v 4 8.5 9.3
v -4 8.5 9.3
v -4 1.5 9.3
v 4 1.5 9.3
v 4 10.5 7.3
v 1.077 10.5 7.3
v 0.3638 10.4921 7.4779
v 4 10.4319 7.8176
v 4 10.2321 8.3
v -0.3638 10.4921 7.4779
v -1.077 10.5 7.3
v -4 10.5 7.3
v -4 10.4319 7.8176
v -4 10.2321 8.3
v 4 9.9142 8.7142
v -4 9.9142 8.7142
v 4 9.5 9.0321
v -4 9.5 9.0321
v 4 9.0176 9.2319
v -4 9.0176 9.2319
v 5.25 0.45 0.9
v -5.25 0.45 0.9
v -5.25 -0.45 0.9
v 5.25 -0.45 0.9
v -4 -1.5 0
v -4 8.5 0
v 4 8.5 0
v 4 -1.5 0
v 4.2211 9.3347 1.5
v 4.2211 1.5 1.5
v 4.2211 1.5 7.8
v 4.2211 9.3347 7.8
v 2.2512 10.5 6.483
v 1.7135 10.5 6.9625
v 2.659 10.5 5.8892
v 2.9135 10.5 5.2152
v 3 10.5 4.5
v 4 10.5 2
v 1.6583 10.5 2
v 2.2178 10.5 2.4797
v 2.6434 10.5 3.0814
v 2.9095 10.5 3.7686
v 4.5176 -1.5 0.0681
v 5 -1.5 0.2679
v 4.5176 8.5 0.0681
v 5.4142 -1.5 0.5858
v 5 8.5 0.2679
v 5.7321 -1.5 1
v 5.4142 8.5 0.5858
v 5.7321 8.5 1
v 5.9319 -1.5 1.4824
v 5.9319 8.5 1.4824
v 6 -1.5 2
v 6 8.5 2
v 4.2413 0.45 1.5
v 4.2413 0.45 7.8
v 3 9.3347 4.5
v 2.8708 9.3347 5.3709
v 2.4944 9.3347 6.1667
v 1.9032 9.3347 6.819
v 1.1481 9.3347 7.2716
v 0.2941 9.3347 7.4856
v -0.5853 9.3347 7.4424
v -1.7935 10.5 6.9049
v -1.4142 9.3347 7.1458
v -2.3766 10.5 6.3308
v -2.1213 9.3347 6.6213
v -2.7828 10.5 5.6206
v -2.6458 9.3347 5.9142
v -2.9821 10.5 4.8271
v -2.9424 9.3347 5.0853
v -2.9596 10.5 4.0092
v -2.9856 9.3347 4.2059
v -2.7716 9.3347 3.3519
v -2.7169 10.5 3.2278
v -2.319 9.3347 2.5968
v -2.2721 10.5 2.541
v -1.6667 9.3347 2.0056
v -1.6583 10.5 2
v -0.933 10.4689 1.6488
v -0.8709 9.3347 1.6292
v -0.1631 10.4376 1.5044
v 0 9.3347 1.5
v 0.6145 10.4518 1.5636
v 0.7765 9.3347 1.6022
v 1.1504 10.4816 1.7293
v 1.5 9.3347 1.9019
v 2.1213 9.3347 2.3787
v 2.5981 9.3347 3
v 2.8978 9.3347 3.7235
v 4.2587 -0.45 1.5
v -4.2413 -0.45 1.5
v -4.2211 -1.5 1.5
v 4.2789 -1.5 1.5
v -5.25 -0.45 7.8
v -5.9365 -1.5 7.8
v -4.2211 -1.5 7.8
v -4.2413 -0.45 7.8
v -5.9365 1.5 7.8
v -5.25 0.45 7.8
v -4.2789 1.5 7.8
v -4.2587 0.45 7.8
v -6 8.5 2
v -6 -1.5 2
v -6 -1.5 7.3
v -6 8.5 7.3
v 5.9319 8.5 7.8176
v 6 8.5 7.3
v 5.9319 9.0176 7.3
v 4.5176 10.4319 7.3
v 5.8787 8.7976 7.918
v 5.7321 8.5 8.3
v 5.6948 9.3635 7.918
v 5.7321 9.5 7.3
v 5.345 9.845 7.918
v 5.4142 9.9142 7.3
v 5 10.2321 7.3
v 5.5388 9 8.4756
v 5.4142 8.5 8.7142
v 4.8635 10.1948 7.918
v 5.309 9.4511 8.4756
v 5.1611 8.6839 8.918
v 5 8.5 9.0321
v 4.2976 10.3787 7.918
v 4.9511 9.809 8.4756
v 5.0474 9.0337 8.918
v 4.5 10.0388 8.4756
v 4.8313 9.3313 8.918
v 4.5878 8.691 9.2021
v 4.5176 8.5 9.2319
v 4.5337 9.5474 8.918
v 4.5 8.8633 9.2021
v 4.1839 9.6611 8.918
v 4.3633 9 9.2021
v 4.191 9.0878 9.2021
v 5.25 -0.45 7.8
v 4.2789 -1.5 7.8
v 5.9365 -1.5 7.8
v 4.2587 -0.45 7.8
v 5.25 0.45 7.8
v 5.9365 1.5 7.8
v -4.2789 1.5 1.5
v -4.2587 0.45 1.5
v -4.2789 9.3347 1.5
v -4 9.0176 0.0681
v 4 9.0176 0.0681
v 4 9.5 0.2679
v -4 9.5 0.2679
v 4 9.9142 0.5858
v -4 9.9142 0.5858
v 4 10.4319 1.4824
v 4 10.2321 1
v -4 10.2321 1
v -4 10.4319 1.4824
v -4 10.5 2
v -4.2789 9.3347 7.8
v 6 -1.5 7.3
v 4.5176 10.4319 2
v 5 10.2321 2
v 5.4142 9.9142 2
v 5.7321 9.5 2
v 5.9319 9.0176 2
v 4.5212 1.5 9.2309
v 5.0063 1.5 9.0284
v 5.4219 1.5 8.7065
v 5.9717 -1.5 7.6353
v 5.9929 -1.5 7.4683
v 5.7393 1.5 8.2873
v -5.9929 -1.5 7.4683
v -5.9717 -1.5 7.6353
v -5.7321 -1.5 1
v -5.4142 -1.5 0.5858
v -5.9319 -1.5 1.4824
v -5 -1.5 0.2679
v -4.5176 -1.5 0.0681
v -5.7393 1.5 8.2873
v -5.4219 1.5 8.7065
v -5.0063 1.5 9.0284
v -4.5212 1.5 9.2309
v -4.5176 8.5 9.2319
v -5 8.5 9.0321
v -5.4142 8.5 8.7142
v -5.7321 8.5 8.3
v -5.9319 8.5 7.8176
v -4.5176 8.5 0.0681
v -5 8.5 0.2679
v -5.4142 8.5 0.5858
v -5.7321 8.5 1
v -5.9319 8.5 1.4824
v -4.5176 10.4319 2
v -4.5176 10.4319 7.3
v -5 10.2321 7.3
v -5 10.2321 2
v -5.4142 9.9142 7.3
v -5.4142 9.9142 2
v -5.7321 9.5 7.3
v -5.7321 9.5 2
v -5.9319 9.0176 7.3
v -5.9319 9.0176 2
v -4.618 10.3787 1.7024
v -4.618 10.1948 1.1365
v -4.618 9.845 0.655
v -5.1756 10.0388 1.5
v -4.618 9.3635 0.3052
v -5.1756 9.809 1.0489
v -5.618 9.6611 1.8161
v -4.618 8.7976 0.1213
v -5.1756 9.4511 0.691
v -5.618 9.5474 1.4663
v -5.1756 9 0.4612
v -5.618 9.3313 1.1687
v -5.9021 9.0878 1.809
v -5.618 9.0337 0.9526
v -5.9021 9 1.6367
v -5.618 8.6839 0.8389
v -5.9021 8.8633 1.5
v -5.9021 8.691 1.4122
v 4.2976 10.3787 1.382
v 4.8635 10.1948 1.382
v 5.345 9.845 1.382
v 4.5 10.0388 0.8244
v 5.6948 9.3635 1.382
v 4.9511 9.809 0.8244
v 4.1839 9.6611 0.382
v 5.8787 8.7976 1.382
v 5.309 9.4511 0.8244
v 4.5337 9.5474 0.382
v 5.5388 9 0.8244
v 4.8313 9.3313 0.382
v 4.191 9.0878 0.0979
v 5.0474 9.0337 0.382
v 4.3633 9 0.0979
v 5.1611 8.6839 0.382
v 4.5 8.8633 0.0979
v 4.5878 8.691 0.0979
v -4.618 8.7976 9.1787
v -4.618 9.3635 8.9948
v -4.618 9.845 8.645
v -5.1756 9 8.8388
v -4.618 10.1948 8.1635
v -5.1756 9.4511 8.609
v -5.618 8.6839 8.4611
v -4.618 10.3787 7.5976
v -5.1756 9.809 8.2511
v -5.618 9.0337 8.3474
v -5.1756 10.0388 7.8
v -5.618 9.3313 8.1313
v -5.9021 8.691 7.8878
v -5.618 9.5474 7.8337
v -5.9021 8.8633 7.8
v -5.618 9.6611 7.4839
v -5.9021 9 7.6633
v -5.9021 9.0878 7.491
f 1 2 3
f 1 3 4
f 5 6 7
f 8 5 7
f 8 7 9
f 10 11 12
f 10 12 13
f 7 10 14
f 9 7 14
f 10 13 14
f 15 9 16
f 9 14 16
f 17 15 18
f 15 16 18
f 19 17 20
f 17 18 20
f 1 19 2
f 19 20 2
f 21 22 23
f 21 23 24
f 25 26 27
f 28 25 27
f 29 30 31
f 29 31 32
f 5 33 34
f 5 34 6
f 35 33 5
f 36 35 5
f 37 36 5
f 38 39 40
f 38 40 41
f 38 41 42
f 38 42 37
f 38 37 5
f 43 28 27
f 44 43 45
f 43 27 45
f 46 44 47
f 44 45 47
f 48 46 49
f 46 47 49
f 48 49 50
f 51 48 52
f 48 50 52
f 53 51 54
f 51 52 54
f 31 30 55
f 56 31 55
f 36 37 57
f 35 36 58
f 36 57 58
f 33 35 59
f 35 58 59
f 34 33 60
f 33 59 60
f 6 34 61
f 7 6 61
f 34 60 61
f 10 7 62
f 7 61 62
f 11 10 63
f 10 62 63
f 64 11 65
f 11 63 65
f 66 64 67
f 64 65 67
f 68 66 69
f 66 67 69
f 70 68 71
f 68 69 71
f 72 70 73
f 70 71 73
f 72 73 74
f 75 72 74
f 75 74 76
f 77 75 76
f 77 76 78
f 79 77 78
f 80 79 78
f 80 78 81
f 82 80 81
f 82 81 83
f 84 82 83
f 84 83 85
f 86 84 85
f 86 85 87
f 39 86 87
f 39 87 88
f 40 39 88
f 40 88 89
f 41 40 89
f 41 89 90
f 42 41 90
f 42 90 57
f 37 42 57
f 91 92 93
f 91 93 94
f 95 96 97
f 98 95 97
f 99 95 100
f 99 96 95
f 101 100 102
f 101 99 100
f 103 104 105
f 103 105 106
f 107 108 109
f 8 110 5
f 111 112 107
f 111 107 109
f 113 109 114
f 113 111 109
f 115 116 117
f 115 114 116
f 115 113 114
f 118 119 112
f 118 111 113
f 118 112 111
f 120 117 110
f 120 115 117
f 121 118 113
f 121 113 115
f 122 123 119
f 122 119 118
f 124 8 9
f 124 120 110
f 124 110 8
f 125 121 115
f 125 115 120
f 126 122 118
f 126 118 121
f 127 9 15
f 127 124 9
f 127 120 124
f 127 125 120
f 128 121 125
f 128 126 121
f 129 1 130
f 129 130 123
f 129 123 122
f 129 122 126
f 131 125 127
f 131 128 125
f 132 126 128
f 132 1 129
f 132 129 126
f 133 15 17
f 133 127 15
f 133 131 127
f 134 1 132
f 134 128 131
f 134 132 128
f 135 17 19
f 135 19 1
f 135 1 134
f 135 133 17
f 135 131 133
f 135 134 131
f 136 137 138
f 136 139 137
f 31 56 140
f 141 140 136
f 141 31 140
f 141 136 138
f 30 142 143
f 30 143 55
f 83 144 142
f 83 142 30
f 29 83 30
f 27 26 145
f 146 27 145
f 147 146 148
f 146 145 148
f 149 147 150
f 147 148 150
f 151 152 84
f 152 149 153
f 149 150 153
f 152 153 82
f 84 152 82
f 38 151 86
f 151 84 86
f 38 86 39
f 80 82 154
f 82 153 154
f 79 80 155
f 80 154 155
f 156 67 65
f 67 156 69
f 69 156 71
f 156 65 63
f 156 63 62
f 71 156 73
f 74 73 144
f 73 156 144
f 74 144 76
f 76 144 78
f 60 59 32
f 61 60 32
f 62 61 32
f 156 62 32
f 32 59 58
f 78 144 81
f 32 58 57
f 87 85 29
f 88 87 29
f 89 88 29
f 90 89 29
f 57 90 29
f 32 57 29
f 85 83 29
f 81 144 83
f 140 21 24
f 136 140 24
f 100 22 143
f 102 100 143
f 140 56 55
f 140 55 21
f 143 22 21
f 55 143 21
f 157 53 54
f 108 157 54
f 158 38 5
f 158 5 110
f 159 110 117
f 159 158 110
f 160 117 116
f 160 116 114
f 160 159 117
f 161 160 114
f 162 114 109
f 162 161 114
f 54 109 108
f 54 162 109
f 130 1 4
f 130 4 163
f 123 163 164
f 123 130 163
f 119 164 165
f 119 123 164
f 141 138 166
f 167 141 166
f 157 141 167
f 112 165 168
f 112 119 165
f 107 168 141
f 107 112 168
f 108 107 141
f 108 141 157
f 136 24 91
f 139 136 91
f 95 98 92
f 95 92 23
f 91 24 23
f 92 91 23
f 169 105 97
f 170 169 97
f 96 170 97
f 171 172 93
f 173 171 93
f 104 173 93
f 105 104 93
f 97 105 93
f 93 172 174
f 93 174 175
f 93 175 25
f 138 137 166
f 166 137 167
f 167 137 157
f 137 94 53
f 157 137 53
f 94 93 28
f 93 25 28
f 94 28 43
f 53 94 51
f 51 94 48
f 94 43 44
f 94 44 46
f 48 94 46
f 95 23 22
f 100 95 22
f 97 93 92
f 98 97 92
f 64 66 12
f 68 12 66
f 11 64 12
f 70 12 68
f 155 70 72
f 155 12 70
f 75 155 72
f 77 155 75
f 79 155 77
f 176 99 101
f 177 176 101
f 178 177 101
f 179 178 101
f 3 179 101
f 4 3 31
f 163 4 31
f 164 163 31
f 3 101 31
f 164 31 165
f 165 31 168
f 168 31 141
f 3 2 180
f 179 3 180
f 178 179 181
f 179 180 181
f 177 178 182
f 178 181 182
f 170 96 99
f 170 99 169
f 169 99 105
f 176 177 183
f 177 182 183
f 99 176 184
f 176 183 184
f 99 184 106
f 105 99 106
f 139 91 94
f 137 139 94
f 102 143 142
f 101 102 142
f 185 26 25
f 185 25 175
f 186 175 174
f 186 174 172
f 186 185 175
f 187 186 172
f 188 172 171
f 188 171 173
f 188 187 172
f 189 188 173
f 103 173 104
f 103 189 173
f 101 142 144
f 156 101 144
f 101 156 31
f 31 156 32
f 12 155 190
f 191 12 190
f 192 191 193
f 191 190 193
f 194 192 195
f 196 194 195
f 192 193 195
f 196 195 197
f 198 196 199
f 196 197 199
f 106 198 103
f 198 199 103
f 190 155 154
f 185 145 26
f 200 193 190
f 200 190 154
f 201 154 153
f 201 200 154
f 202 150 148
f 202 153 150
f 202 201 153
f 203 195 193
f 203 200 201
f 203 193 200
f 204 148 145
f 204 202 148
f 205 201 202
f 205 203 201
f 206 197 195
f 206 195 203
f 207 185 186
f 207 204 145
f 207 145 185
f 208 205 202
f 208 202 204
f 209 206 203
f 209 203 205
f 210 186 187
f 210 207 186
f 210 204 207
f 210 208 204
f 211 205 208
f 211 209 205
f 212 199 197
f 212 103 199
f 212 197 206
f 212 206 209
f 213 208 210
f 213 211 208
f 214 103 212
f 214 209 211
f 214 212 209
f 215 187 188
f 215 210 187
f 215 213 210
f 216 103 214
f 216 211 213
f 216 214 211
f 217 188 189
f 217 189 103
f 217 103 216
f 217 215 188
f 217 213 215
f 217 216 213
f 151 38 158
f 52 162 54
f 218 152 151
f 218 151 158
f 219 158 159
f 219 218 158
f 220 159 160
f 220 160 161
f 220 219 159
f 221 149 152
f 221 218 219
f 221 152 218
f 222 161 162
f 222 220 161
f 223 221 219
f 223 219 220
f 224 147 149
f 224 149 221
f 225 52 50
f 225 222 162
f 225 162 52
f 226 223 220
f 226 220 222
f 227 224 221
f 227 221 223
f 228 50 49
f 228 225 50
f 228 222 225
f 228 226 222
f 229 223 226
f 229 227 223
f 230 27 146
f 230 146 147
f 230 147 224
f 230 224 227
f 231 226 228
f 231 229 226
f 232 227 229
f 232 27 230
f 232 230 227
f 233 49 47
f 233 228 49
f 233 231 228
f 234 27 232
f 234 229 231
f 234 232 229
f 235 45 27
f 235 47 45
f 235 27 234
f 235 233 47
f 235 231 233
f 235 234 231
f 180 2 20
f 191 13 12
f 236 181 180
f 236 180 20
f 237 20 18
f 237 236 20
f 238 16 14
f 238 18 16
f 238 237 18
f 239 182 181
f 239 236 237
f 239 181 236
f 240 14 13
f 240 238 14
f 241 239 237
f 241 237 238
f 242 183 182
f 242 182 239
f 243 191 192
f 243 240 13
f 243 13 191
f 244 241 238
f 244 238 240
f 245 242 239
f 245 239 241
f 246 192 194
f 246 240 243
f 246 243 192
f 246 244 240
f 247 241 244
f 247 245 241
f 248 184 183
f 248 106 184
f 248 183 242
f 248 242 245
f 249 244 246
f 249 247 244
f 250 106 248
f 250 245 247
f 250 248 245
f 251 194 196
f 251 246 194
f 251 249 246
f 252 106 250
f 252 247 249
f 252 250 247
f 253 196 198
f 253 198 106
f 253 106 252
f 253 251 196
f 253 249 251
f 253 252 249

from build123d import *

# Parameters (mm, degrees)
F0_W         = 8.5
F0_H         = 7.834737435
F0_W_2       = 1.7211329822
F0_H_2       = 1.165262565
F0_W_3       = 1.7788670178
F1_DEPTH     = 0.9
F2_DEPTH     = 1.5
F3_DEPTH     = 7.8
F5_W         = 12
F5_H         = 9
F6_DEPTH     = 1.5
F7_R         = 3
F8_DEPTH     = 10.501
F9_T1_DEPTH  = 5.3
F9_T3_DEPTH  = 8
F9_T5_DEPTH  = 12
F9_T7_DEPTH  = 15
F9_S11_W     = 2
F9_S11_H     = 2
F9_T12_DEPTH = 2
F9_S17_W     = 2
F9_S17_H     = 2
F9_T18_DEPTH = 2
F9_S23_W     = 2
F9_S23_H     = 2
F9_T24_DEPTH = 2
F9_S29_W     = 2
F9_S29_H     = 2
F9_T30_DEPTH = 2


# Not quite as in the source:
# - a fillet or chamfer that OpenCascade refuses, or shapes differently, is made with other operations: its cross-section is extruded or revolved along the edge and cut away or added
# - a feature names something its author has since deleted; it is built from what else it names


with BuildPart() as f1:
    # F0 (on Top) → F1 (new body)
    with BuildSketch(Plane.XY):
        with Locations((-0.0288670178, 5.4173687175)):
            Rectangle(F0_W, F0_H)
        Polygon((-6, 1.5), (-6, -1.5), (-4.2211329822, -1.5), (-4.2413398946, -0.45), (-5.25, -0.45), (-5.25, 0.45), (-4.2586601054, 0.45), (-4.2788670178, 1.5), align=None)
        Polygon((4.2211329822, 1.5), (-4.2788670178, 1.5), (-4.2586601054, 0.45), (4.2413398946, 0.45), align=None)
        with Locations((-5.1394335089, 5.4173687175)):
            Rectangle(F0_W_2, F0_H)
        Polygon((4.2586601054, -0.45), (4.2788670178, -1.5), (6, -1.5), (6, 1.5), (4.2211329822, 1.5), (4.2413398946, 0.45), (5.25, 0.45), (5.25, -0.45), align=None)
        Polygon((-4.2413398946, -0.45), (-4.2211329822, -1.5), (4.2788670178, -1.5), (4.2586601054, -0.45), align=None)
        Polygon((-4.2586601054, 0.45), (-4.2413398946, -0.45), (4.2586601054, -0.45), (4.2413398946, 0.45), align=None)
        Polygon((-5.25, -0.45), (-4.2413398946, -0.45), (-4.2586601054, 0.45), (-5.25, 0.45), align=None)
        Polygon((4.2413398946, 0.45), (4.2586601054, -0.45), (5.25, -0.45), (5.25, 0.45), align=None)
        with Locations((-5.1394335089, 9.9173687175)):
            Rectangle(F0_W_2, F0_H_2)
        with Locations((-0.0288670178, 9.9173687175)):
            Rectangle(F0_W, F0_H_2)
        with Locations((5.1105664911, 9.9173687175)):
            Rectangle(F0_W_3, F0_H_2)
        with Locations((5.1105664911, 5.4173687175)):
            Rectangle(F0_W_3, F0_H)
    extrude(amount=F1_DEPTH)

    # F0 (on Top) → F2 (join)
    with BuildSketch(Plane.XY):
        Polygon((-4.2413398946, -0.45), (-4.2211329822, -1.5), (4.2788670178, -1.5), (4.2586601054, -0.45), align=None)
        Polygon((-6, 1.5), (-6, -1.5), (-4.2211329822, -1.5), (-4.2413398946, -0.45), (-5.25, -0.45), (-5.25, 0.45), (-4.2586601054, 0.45), (-4.2788670178, 1.5), align=None)
        Polygon((4.2586601054, -0.45), (4.2788670178, -1.5), (6, -1.5), (6, 1.5), (4.2211329822, 1.5), (4.2413398946, 0.45), (5.25, 0.45), (5.25, -0.45), align=None)
        Polygon((4.2211329822, 1.5), (-4.2788670178, 1.5), (-4.2586601054, 0.45), (4.2413398946, 0.45), align=None)
        with Locations((-5.1394335089, 5.4173687175)):
            Rectangle(F0_W_2, F0_H)
        with Locations((5.1105664911, 5.4173687175)):
            Rectangle(F0_W_3, F0_H)
        with Locations((-0.0288670178, 5.4173687175)):
            Rectangle(F0_W, F0_H)
        with Locations((-5.1394335089, 9.9173687175)):
            Rectangle(F0_W_2, F0_H_2)
        with Locations((-0.0288670178, 9.9173687175)):
            Rectangle(F0_W, F0_H_2)
        with Locations((5.1105664911, 9.9173687175)):
            Rectangle(F0_W_3, F0_H_2)
    extrude(amount=F2_DEPTH)

    # F0 (on Top) → F3 (join)
    with BuildSketch(Plane.XY):
        Polygon((-6, 1.5), (-6, -1.5), (-4.2211329822, -1.5), (-4.2413398946, -0.45), (-5.25, -0.45), (-5.25, 0.45), (-4.2586601054, 0.45), (-4.2788670178, 1.5), align=None)
        Polygon((4.2586601054, -0.45), (4.2788670178, -1.5), (6, -1.5), (6, 1.5), (4.2211329822, 1.5), (4.2413398946, 0.45), (5.25, 0.45), (5.25, -0.45), align=None)
        with Locations((-5.1394335089, 5.4173687175)):
            Rectangle(F0_W_2, F0_H)
        with Locations((5.1105664911, 5.4173687175)):
            Rectangle(F0_W_3, F0_H)
        with Locations((-5.1394335089, 9.9173687175)):
            Rectangle(F0_W_2, F0_H_2)
        with Locations((-0.0288670178, 9.9173687175)):
            Rectangle(F0_W, F0_H_2)
        with Locations((5.1105664911, 9.9173687175)):
            Rectangle(F0_W_3, F0_H_2)
    extrude(amount=F3_DEPTH)

    # F5 (on offset) → F6 (join)
    with BuildSketch(Plane.XY.offset(7.8)):
        with Locations((0, 6)):
            Rectangle(F5_W, F5_H)
    extrude(amount=F6_DEPTH)

    # F7 (on Front) → F8 (cut, through all)
    with BuildSketch(Plane.XZ):
        with Locations((0, 4.5)):
            Circle(F7_R)
    extrude(amount=-F8_DEPTH, mode=Mode.SUBTRACT)

    # F9: fillet of radius 2 on 8 edges, made by hand

    # F9_s2 → F9_t1 (cut)
    with BuildSketch(Plane.XY.offset(2)):
        with BuildLine():
            ThreePointArc((4, 10.5), (5.4142135624, 9.9142135624), (6, 8.5))
            Line((6, 8.5), (6, 10.5))
            Line((6, 10.5), (4, 10.5))
        make_face()
        with BuildLine():
            ThreePointArc((-4, 10.5), (-5.4142135624, 9.9142135624), (-6, 8.5))
            Line((-6, 8.5), (-6, 10.5))
            Line((-6, 10.5), (-4, 10.5))
        make_face()
    extrude(amount=F9_T1_DEPTH, mode=Mode.SUBTRACT)

    # F9_s4 → F9_t3 (cut)
    with BuildSketch(Plane.YZ.offset(-4)):
        with BuildLine():
            ThreePointArc((10.5, 7.3), (9.9142135624, 8.7142135624), (8.5, 9.3))
            Line((8.5, 9.3), (10.5, 9.3))
            Line((10.5, 9.3), (10.5, 7.3))
        make_face()
        with BuildLine():
            ThreePointArc((8.5, 0), (9.9142135624, 0.5857864376), (10.5, 2))
            Line((10.5, 2), (10.5, 0))
            Line((10.5, 0), (8.5, 0))
        make_face()
    extrude(amount=F9_T3_DEPTH, mode=Mode.SUBTRACT)

    # F9_s6 → F9_t5 (cut)
    with BuildSketch(Plane.XZ.offset(-8.5)):
        with BuildLine():
            ThreePointArc((4, 9.3), (5.4142135624, 8.7142135624), (6, 7.3))
            Line((6, 7.3), (6, 9.3))
            Line((6, 9.3), (4, 9.3))
        make_face()
        with BuildLine():
            ThreePointArc((-4, 9.3), (-5.4142135624, 8.7142135624), (-6, 7.3))
            Line((-6, 7.3), (-6, 9.3))
            Line((-6, 9.3), (-4, 9.3))
        make_face()
    extrude(amount=F9_T5_DEPTH, mode=Mode.SUBTRACT)

    # F9_s8 → F9_t7 (cut)
    with BuildSketch(Plane.XZ.offset(-8.5)):
        with BuildLine():
            ThreePointArc((4, 0), (5.4142135624, 0.5857864376), (6, 2))
            Line((6, 2), (6, 0))
            Line((6, 0), (4, 0))
        make_face()
        with BuildLine():
            ThreePointArc((-4, 0), (-5.4142135624, 0.5857864376), (-6, 2))
            Line((-6, 2), (-6, 0))
            Line((-6, 0), (-4, 0))
        make_face()
    extrude(amount=F9_T7_DEPTH, mode=Mode.SUBTRACT)


with BuildPart() as f9_tool10:
    # F9_s11 → F9_t12 (new body)
    with BuildSketch(Plane.XY.offset(2)):
        with Locations((5, 9.5)):
            Rectangle(F9_S11_W, F9_S11_H)
    extrude(amount=-F9_T12_DEPTH)

    # F9_s13 → F9_t14 (revolve, cut)
    with BuildSketch(Plane(origin=(4, 8.5, 2), x_dir=(-0.7071067812, -0.7071067812, 0), z_dir=(0.7071067812, -0.7071067812, 0))):
        with BuildLine():
            ThreePointArc((0, -2), (2, 0), (0, 2))
            Line((0, 2), (0, -2))
        make_face()
    revolve(axis=Axis((4, 8.5, 2), (0, 0, -1)), mode=Mode.SUBTRACT)


with BuildPart() as f1_1:
    add(f1.part)

    # F9_t9: cut F9_tool10
    add(f9_tool10.part, mode=Mode.SUBTRACT)


with BuildPart() as f9_tool16:
    # F9_s17 → F9_t18 (new body)
    with BuildSketch(Plane.XY.offset(7.3)):
        with Locations((5, 9.5)):
            Rectangle(F9_S17_W, F9_S17_H)
    extrude(amount=F9_T18_DEPTH)

    # F9_s19 → F9_t20 (revolve, cut)
    with BuildSketch(Plane(origin=(4, 8.5, 7.3), x_dir=(-0.7071067812, -0.7071067812, 0), z_dir=(-0.7071067812, 0.7071067812, 0))):
        with BuildLine():
            ThreePointArc((0, -2), (2, 0), (0, 2))
            Line((0, 2), (0, -2))
        make_face()
    revolve(axis=Axis((4, 8.5, 7.3), (0, 0, 1)), mode=Mode.SUBTRACT)


with BuildPart() as f1_2:
    add(f1_1.part)

    # F9_t15: cut F9_tool16
    add(f9_tool16.part, mode=Mode.SUBTRACT)


with BuildPart() as f9_tool22:
    # F9_s23 → F9_t24 (new body)
    with BuildSketch(Plane.YZ.offset(-4)):
        with Locations((9.5, 8.3)):
            Rectangle(F9_S23_W, F9_S23_H)
    extrude(amount=-F9_T24_DEPTH)

    # F9_s25 → F9_t26 (revolve, cut)
    with BuildSketch(Plane(origin=(-4, 8.5, 7.3), x_dir=(0, -0.7071067812, -0.7071067812), z_dir=(0, 0.7071067812, -0.7071067812))):
        with BuildLine():
            ThreePointArc((0, -2), (2, 0), (0, 2))
            Line((0, 2), (0, -2))
        make_face()
    revolve(axis=Axis((-4, 8.5, 7.3), (-1, 0, 0)), mode=Mode.SUBTRACT)


with BuildPart() as f1_3:
    add(f1_2.part)

    # F9_t21: cut F9_tool22
    add(f9_tool22.part, mode=Mode.SUBTRACT)


with BuildPart() as f9_tool28:
    # F9_s29 → F9_t30 (new body)
    with BuildSketch(Plane.YZ.offset(-4)):
        with Locations((9.5, 1)):
            Rectangle(F9_S29_W, F9_S29_H)
    extrude(amount=-F9_T30_DEPTH)

    # F9_s31 → F9_t32 (revolve, cut)
    with BuildSketch(Plane(origin=(-4, 8.5, 2), x_dir=(0, -0.7071067812, 0.7071067812), z_dir=(0, -0.7071067812, -0.7071067812))):
        with BuildLine():
            ThreePointArc((0, -2), (2, 0), (0, 2))
            Line((0, 2), (0, -2))
        make_face()
    revolve(axis=Axis((-4, 8.5, 2), (-1, 0, 0)), mode=Mode.SUBTRACT)


with BuildPart() as f1_4:
    add(f1_3.part)

    # F9_t27: cut F9_tool28
    add(f9_tool28.part, mode=Mode.SUBTRACT)


solid = f1_4.part
